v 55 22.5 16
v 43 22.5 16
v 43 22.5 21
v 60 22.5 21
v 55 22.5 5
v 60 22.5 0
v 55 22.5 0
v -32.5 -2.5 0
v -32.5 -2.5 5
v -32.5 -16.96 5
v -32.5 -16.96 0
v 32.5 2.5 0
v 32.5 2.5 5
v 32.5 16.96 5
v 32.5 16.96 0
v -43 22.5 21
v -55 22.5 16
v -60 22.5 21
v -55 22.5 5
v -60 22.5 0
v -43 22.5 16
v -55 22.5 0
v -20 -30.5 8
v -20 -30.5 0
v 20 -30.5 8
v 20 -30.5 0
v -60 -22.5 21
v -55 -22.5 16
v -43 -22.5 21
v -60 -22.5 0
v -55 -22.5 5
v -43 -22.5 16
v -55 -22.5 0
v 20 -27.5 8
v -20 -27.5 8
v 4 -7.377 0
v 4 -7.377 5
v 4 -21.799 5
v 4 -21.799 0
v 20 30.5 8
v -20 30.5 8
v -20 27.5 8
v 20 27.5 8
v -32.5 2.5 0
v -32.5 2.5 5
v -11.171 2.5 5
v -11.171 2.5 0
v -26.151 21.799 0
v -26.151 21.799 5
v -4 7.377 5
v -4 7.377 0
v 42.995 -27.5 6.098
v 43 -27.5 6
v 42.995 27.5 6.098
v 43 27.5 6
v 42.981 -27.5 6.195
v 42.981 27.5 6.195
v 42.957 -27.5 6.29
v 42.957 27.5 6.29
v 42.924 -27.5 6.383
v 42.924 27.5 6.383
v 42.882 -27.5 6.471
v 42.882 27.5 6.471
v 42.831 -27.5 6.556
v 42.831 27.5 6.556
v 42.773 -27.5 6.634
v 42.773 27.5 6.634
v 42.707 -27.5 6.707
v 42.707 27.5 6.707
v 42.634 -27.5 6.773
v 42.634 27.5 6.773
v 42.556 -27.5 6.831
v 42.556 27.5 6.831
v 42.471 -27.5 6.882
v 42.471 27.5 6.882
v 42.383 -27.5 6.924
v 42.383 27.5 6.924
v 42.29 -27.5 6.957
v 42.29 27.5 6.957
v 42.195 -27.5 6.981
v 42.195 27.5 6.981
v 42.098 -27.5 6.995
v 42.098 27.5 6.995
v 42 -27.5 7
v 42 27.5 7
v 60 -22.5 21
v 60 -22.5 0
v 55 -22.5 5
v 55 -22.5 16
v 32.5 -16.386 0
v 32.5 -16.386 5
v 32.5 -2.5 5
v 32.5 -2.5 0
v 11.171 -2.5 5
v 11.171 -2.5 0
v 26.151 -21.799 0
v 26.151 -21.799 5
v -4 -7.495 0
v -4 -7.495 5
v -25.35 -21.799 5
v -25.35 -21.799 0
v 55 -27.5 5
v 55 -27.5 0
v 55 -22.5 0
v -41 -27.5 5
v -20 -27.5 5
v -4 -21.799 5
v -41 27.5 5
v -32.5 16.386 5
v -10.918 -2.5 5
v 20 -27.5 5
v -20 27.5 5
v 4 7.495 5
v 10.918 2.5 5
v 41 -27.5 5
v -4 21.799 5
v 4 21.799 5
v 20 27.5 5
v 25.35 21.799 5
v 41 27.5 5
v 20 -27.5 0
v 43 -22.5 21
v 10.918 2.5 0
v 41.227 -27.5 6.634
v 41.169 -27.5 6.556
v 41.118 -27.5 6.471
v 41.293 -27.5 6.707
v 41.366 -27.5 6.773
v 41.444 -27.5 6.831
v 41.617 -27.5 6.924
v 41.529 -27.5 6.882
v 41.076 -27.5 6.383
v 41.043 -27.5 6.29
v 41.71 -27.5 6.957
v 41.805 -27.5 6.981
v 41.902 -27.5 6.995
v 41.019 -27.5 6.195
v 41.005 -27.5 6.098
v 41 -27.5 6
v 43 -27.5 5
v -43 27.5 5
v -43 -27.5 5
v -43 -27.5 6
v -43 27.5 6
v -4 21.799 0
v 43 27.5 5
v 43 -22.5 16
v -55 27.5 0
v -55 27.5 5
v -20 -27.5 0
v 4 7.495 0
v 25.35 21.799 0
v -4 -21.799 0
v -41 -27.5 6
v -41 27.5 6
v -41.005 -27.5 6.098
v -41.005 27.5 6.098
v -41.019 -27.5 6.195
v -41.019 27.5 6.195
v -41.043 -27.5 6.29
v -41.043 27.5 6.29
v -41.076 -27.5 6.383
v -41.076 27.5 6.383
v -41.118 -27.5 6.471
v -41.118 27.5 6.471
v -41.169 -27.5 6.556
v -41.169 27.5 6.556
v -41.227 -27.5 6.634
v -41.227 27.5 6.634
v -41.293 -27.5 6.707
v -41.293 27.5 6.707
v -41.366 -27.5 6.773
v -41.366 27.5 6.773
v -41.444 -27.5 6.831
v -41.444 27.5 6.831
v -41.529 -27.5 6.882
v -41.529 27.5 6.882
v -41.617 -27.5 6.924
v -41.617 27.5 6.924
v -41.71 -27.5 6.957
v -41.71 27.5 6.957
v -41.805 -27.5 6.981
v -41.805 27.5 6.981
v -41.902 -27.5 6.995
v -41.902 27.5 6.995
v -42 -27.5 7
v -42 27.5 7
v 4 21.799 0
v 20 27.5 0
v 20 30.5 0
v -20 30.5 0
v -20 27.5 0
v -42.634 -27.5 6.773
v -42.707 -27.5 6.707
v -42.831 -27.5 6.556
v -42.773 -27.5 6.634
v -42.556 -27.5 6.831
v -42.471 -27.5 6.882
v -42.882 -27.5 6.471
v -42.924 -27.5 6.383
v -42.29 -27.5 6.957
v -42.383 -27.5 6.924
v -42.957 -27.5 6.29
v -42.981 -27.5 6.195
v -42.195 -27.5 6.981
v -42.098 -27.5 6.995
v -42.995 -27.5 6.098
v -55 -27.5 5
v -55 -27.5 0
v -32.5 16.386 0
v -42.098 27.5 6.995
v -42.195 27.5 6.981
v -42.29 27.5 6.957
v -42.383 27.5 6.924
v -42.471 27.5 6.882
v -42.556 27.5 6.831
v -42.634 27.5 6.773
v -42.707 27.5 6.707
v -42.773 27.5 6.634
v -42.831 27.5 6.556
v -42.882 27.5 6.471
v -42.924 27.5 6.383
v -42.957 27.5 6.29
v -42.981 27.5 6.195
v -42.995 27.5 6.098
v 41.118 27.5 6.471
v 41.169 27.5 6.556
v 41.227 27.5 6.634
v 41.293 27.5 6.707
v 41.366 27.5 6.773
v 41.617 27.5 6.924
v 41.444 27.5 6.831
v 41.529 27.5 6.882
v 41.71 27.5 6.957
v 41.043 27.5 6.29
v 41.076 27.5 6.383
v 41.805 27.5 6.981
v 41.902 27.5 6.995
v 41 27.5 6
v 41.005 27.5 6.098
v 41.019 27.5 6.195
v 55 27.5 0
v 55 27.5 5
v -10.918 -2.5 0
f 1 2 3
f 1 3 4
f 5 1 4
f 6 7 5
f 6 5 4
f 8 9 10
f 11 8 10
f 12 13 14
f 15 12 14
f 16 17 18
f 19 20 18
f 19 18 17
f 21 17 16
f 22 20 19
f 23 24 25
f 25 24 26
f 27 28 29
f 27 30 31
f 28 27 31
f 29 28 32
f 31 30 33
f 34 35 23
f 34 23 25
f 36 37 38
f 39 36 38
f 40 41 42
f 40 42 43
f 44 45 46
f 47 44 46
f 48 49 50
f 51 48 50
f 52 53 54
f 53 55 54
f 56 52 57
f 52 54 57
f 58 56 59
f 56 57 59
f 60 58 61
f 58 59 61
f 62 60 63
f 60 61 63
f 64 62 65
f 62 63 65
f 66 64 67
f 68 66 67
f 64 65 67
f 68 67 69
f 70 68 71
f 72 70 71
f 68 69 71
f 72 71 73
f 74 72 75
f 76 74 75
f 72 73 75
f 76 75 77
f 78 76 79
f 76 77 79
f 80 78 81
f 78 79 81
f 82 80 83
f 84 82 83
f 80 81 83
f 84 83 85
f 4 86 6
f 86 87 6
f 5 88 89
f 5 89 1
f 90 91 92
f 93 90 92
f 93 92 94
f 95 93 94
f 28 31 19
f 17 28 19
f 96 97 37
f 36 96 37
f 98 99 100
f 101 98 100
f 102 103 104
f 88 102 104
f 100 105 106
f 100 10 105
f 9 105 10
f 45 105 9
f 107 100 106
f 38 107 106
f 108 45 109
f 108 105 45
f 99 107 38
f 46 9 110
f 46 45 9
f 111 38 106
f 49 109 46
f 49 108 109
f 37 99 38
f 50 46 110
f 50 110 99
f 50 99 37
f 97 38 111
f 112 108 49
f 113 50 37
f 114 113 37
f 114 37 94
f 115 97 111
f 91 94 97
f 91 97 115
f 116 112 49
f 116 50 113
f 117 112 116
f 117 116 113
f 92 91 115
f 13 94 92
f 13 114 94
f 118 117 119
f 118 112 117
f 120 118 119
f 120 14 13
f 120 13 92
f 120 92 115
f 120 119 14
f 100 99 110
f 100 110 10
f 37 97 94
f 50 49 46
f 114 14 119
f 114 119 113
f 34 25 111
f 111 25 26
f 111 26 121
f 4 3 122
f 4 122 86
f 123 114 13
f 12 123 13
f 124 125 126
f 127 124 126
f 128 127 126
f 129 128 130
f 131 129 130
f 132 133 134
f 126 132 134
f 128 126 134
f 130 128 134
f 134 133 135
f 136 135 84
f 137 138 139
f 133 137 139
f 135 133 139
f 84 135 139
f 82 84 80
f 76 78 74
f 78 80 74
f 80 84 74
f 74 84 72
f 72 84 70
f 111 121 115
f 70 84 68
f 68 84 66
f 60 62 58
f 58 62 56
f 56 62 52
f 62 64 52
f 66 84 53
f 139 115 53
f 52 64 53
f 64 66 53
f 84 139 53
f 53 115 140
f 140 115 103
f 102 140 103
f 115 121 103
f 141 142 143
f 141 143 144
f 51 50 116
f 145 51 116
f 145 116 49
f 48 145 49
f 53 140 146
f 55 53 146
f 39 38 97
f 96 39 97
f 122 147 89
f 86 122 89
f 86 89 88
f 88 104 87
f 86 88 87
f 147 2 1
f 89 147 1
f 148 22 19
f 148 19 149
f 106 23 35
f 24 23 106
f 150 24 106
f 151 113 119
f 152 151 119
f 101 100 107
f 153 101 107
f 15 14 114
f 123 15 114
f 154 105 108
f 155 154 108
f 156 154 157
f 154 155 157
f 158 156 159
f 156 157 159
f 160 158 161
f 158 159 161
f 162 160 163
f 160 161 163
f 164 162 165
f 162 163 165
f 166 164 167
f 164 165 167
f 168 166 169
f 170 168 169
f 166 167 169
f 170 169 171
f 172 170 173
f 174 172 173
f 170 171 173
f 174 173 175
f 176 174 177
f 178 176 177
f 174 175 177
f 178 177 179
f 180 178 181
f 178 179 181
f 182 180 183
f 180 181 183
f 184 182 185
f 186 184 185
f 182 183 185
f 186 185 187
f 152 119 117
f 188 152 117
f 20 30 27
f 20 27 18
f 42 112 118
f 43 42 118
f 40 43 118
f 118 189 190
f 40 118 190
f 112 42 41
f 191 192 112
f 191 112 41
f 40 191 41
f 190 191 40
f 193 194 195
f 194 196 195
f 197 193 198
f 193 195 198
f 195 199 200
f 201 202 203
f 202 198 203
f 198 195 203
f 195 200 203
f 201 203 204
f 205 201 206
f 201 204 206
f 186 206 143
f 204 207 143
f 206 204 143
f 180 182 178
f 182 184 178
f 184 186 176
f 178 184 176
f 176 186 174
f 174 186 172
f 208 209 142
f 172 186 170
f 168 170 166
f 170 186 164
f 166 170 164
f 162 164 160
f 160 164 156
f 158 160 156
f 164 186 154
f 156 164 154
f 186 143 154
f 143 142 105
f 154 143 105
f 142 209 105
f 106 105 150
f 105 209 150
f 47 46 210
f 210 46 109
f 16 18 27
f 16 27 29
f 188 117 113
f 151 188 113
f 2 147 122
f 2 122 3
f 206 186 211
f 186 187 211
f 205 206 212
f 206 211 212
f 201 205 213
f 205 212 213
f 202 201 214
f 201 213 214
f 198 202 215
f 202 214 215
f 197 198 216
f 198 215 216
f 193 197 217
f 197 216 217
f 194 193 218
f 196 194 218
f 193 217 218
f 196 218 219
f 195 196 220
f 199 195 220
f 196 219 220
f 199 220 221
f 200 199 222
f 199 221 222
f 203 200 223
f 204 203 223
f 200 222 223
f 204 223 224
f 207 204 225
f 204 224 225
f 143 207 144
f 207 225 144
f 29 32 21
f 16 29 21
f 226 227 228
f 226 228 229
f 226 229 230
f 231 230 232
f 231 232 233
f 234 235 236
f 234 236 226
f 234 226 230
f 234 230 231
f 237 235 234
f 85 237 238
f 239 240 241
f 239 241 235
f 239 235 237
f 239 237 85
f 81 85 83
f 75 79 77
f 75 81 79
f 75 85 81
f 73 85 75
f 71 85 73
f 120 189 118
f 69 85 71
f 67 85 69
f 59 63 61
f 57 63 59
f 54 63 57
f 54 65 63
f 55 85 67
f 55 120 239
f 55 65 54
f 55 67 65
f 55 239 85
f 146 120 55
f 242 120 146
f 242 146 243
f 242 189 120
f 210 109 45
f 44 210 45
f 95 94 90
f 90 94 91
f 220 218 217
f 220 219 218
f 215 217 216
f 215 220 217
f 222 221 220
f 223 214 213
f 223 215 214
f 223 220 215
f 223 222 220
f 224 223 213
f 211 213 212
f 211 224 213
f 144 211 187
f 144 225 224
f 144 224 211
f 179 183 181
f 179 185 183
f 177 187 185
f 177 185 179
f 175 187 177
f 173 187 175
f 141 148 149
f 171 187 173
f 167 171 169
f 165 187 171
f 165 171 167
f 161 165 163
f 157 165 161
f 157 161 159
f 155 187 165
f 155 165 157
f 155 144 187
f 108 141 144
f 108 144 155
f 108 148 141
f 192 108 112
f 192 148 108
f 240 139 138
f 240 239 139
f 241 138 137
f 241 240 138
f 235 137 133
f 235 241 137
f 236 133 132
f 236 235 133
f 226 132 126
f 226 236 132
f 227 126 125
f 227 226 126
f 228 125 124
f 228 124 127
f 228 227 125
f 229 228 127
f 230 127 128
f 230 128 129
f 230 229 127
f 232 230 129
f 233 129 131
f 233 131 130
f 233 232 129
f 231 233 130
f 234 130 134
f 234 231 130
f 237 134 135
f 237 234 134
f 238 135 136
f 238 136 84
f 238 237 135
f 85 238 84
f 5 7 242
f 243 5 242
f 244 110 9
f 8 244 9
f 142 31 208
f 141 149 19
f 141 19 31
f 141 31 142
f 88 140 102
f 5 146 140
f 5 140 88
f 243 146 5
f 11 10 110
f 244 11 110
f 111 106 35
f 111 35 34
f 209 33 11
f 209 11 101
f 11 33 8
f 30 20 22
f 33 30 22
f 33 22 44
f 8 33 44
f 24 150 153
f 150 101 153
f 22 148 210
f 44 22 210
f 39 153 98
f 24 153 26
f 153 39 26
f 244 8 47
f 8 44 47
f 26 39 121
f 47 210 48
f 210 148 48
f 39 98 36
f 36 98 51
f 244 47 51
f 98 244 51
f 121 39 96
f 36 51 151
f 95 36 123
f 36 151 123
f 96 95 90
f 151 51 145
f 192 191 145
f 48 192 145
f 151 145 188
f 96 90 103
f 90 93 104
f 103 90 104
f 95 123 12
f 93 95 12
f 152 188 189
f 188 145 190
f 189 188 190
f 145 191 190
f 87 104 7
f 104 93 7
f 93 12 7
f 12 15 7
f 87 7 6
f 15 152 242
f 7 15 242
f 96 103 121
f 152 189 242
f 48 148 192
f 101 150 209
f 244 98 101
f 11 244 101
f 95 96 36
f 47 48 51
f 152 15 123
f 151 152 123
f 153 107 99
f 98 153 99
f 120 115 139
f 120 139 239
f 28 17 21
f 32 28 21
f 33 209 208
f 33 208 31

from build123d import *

# Parameters (mm, degrees)
SKETCH1_W             = 82
SKETCH1_H             = 55
BOSS_EXTRUDE1_DEPTH   = 5
SKETCH1_W_2           = 12
BOSS_EXTRUDE1_2_DEPTH = 5
BOSS_EXTRUDE1_3_DEPTH = 5
SKETCH1_3_W           = 2
SKETCH1_3_H           = 55
BOSS_EXTRUDE2_DEPTH   = 7
FILLET1_R             = 1
SKETCH2_W             = 5
SKETCH2_H             = 45
BOSS_EXTRUDE3_DEPTH   = 16
SKETCH3_W             = 17
SKETCH3_H             = 45
BOSS_EXTRUDE4_DEPTH   = 5
SKETCH4_W             = 40
SKETCH4_H             = 3
BOSS_EXTRUDE5_DEPTH   = 8
CUT_EXTRUDE1_DEPTH    = 8


with BuildPart() as part:
    # Sketch1 → Boss-Extrude1 (new body)
    with BuildSketch(Plane.XY):
        Rectangle(SKETCH1_W, SKETCH1_H)
    extrude(amount=BOSS_EXTRUDE1_DEPTH)



with BuildPart() as body_2:
    # Sketch1 → Boss-Extrude1 2 (new body)
    with BuildSketch(Plane.XY):
        with Locations((-49, 0)):
            Rectangle(SKETCH1_W_2, SKETCH1_H)
    extrude(amount=BOSS_EXTRUDE1_2_DEPTH)


with BuildPart() as body_3:
    # Sketch1 → Boss-Extrude1 3 (new body)
    with BuildSketch(Plane.XY):
        with Locations((49, 0)):
            Rectangle(SKETCH1_W_2, SKETCH1_H)
    extrude(amount=BOSS_EXTRUDE1_3_DEPTH)


with BuildPart() as part_1:
    add(part.part)

    add(body_2.part)  # Boss-Extrude2 merges body 2

    add(body_3.part)  # Boss-Extrude2 merges body 3
    # Sketch1<3> → Boss-Extrude2 (add)
    with BuildSketch(Plane.XY):
        with Locations((42, 0)):
            Rectangle(SKETCH1_3_W, SKETCH1_3_H)
        with Locations((-42, 0)):
            Rectangle(SKETCH1_3_W, SKETCH1_3_H)
    extrude(amount=BOSS_EXTRUDE2_DEPTH)

    # Fillet1
    fillet1_edges = [part_1.edges().sort_by_distance(p)[0] for p in [
        (-43, 0, 7),
        (-41, 0, 7),
        (41, 0, 7),
        (43, 0, 7),
    ]]
    fillet(fillet1_edges, radius=FILLET1_R - 0.0001)  # a hair under: the kernel refuses the full size

    # Sketch2 → Boss-Extrude3 (add)
    with BuildSketch(Plane.XY):
        with Locations((-57.5, 0)):
            Rectangle(SKETCH2_W, SKETCH2_H)
        with Locations((57.5, 0)):
            Rectangle(SKETCH2_W, SKETCH2_H)
    extrude(amount=BOSS_EXTRUDE3_DEPTH)

    # Sketch3 → Boss-Extrude4 (add)
    with BuildSketch(Plane.XY.offset(16)):
        with Locations((51.5, 0)):
            Rectangle(SKETCH3_W, SKETCH3_H)
        with Locations((-51.5, 0)):
            Rectangle(SKETCH3_W, SKETCH3_H)
    extrude(amount=BOSS_EXTRUDE4_DEPTH)

    # Sketch4 → Boss-Extrude5 (add)
    with BuildSketch(Plane.XY):
        with Locations((0, -29)):
            Rectangle(SKETCH4_W, SKETCH4_H)
        with Locations((0, 29)):
            Rectangle(SKETCH4_W, SKETCH4_H)
    extrude(amount=BOSS_EXTRUDE5_DEPTH)

    # Sketch5 → Cut-Extrude1 (cut)
    with BuildSketch(Plane.XY.offset(5)):
        Polygon((32.5, -2.5), (11.171238341, -2.5), (32.5, -16.386089579), align=None)
        Polygon((26.151212641, -21.798780488), (4, -7.377234224), (4, -21.798780488), align=None)
        Polygon((-4, -7.494684737), (-25.350036879, -21.798780488), (-4, -21.798780488), align=None)
        Polygon((-10.917888224, -2.5), (-32.5, -2.5), (-32.5, -16.959581269), align=None)
        Polygon((-11.171238341, 2.5), (-32.5, 16.386089579), (-32.5, 2.5), align=None)
        Polygon((-4, 21.798780488), (-26.151212641, 21.798780488), (-4, 7.377234224), align=None)
        Polygon((25.350035913, 21.798780488), (4, 21.798780488), (4, 7.494685385), align=None)
        Polygon((32.5, 2.5), (32.5, 16.959581917), (10.917887257, 2.5), align=None)
    extrude(amount=-CUT_EXTRUDE1_DEPTH, mode=Mode.SUBTRACT)


solid = part_1.part
